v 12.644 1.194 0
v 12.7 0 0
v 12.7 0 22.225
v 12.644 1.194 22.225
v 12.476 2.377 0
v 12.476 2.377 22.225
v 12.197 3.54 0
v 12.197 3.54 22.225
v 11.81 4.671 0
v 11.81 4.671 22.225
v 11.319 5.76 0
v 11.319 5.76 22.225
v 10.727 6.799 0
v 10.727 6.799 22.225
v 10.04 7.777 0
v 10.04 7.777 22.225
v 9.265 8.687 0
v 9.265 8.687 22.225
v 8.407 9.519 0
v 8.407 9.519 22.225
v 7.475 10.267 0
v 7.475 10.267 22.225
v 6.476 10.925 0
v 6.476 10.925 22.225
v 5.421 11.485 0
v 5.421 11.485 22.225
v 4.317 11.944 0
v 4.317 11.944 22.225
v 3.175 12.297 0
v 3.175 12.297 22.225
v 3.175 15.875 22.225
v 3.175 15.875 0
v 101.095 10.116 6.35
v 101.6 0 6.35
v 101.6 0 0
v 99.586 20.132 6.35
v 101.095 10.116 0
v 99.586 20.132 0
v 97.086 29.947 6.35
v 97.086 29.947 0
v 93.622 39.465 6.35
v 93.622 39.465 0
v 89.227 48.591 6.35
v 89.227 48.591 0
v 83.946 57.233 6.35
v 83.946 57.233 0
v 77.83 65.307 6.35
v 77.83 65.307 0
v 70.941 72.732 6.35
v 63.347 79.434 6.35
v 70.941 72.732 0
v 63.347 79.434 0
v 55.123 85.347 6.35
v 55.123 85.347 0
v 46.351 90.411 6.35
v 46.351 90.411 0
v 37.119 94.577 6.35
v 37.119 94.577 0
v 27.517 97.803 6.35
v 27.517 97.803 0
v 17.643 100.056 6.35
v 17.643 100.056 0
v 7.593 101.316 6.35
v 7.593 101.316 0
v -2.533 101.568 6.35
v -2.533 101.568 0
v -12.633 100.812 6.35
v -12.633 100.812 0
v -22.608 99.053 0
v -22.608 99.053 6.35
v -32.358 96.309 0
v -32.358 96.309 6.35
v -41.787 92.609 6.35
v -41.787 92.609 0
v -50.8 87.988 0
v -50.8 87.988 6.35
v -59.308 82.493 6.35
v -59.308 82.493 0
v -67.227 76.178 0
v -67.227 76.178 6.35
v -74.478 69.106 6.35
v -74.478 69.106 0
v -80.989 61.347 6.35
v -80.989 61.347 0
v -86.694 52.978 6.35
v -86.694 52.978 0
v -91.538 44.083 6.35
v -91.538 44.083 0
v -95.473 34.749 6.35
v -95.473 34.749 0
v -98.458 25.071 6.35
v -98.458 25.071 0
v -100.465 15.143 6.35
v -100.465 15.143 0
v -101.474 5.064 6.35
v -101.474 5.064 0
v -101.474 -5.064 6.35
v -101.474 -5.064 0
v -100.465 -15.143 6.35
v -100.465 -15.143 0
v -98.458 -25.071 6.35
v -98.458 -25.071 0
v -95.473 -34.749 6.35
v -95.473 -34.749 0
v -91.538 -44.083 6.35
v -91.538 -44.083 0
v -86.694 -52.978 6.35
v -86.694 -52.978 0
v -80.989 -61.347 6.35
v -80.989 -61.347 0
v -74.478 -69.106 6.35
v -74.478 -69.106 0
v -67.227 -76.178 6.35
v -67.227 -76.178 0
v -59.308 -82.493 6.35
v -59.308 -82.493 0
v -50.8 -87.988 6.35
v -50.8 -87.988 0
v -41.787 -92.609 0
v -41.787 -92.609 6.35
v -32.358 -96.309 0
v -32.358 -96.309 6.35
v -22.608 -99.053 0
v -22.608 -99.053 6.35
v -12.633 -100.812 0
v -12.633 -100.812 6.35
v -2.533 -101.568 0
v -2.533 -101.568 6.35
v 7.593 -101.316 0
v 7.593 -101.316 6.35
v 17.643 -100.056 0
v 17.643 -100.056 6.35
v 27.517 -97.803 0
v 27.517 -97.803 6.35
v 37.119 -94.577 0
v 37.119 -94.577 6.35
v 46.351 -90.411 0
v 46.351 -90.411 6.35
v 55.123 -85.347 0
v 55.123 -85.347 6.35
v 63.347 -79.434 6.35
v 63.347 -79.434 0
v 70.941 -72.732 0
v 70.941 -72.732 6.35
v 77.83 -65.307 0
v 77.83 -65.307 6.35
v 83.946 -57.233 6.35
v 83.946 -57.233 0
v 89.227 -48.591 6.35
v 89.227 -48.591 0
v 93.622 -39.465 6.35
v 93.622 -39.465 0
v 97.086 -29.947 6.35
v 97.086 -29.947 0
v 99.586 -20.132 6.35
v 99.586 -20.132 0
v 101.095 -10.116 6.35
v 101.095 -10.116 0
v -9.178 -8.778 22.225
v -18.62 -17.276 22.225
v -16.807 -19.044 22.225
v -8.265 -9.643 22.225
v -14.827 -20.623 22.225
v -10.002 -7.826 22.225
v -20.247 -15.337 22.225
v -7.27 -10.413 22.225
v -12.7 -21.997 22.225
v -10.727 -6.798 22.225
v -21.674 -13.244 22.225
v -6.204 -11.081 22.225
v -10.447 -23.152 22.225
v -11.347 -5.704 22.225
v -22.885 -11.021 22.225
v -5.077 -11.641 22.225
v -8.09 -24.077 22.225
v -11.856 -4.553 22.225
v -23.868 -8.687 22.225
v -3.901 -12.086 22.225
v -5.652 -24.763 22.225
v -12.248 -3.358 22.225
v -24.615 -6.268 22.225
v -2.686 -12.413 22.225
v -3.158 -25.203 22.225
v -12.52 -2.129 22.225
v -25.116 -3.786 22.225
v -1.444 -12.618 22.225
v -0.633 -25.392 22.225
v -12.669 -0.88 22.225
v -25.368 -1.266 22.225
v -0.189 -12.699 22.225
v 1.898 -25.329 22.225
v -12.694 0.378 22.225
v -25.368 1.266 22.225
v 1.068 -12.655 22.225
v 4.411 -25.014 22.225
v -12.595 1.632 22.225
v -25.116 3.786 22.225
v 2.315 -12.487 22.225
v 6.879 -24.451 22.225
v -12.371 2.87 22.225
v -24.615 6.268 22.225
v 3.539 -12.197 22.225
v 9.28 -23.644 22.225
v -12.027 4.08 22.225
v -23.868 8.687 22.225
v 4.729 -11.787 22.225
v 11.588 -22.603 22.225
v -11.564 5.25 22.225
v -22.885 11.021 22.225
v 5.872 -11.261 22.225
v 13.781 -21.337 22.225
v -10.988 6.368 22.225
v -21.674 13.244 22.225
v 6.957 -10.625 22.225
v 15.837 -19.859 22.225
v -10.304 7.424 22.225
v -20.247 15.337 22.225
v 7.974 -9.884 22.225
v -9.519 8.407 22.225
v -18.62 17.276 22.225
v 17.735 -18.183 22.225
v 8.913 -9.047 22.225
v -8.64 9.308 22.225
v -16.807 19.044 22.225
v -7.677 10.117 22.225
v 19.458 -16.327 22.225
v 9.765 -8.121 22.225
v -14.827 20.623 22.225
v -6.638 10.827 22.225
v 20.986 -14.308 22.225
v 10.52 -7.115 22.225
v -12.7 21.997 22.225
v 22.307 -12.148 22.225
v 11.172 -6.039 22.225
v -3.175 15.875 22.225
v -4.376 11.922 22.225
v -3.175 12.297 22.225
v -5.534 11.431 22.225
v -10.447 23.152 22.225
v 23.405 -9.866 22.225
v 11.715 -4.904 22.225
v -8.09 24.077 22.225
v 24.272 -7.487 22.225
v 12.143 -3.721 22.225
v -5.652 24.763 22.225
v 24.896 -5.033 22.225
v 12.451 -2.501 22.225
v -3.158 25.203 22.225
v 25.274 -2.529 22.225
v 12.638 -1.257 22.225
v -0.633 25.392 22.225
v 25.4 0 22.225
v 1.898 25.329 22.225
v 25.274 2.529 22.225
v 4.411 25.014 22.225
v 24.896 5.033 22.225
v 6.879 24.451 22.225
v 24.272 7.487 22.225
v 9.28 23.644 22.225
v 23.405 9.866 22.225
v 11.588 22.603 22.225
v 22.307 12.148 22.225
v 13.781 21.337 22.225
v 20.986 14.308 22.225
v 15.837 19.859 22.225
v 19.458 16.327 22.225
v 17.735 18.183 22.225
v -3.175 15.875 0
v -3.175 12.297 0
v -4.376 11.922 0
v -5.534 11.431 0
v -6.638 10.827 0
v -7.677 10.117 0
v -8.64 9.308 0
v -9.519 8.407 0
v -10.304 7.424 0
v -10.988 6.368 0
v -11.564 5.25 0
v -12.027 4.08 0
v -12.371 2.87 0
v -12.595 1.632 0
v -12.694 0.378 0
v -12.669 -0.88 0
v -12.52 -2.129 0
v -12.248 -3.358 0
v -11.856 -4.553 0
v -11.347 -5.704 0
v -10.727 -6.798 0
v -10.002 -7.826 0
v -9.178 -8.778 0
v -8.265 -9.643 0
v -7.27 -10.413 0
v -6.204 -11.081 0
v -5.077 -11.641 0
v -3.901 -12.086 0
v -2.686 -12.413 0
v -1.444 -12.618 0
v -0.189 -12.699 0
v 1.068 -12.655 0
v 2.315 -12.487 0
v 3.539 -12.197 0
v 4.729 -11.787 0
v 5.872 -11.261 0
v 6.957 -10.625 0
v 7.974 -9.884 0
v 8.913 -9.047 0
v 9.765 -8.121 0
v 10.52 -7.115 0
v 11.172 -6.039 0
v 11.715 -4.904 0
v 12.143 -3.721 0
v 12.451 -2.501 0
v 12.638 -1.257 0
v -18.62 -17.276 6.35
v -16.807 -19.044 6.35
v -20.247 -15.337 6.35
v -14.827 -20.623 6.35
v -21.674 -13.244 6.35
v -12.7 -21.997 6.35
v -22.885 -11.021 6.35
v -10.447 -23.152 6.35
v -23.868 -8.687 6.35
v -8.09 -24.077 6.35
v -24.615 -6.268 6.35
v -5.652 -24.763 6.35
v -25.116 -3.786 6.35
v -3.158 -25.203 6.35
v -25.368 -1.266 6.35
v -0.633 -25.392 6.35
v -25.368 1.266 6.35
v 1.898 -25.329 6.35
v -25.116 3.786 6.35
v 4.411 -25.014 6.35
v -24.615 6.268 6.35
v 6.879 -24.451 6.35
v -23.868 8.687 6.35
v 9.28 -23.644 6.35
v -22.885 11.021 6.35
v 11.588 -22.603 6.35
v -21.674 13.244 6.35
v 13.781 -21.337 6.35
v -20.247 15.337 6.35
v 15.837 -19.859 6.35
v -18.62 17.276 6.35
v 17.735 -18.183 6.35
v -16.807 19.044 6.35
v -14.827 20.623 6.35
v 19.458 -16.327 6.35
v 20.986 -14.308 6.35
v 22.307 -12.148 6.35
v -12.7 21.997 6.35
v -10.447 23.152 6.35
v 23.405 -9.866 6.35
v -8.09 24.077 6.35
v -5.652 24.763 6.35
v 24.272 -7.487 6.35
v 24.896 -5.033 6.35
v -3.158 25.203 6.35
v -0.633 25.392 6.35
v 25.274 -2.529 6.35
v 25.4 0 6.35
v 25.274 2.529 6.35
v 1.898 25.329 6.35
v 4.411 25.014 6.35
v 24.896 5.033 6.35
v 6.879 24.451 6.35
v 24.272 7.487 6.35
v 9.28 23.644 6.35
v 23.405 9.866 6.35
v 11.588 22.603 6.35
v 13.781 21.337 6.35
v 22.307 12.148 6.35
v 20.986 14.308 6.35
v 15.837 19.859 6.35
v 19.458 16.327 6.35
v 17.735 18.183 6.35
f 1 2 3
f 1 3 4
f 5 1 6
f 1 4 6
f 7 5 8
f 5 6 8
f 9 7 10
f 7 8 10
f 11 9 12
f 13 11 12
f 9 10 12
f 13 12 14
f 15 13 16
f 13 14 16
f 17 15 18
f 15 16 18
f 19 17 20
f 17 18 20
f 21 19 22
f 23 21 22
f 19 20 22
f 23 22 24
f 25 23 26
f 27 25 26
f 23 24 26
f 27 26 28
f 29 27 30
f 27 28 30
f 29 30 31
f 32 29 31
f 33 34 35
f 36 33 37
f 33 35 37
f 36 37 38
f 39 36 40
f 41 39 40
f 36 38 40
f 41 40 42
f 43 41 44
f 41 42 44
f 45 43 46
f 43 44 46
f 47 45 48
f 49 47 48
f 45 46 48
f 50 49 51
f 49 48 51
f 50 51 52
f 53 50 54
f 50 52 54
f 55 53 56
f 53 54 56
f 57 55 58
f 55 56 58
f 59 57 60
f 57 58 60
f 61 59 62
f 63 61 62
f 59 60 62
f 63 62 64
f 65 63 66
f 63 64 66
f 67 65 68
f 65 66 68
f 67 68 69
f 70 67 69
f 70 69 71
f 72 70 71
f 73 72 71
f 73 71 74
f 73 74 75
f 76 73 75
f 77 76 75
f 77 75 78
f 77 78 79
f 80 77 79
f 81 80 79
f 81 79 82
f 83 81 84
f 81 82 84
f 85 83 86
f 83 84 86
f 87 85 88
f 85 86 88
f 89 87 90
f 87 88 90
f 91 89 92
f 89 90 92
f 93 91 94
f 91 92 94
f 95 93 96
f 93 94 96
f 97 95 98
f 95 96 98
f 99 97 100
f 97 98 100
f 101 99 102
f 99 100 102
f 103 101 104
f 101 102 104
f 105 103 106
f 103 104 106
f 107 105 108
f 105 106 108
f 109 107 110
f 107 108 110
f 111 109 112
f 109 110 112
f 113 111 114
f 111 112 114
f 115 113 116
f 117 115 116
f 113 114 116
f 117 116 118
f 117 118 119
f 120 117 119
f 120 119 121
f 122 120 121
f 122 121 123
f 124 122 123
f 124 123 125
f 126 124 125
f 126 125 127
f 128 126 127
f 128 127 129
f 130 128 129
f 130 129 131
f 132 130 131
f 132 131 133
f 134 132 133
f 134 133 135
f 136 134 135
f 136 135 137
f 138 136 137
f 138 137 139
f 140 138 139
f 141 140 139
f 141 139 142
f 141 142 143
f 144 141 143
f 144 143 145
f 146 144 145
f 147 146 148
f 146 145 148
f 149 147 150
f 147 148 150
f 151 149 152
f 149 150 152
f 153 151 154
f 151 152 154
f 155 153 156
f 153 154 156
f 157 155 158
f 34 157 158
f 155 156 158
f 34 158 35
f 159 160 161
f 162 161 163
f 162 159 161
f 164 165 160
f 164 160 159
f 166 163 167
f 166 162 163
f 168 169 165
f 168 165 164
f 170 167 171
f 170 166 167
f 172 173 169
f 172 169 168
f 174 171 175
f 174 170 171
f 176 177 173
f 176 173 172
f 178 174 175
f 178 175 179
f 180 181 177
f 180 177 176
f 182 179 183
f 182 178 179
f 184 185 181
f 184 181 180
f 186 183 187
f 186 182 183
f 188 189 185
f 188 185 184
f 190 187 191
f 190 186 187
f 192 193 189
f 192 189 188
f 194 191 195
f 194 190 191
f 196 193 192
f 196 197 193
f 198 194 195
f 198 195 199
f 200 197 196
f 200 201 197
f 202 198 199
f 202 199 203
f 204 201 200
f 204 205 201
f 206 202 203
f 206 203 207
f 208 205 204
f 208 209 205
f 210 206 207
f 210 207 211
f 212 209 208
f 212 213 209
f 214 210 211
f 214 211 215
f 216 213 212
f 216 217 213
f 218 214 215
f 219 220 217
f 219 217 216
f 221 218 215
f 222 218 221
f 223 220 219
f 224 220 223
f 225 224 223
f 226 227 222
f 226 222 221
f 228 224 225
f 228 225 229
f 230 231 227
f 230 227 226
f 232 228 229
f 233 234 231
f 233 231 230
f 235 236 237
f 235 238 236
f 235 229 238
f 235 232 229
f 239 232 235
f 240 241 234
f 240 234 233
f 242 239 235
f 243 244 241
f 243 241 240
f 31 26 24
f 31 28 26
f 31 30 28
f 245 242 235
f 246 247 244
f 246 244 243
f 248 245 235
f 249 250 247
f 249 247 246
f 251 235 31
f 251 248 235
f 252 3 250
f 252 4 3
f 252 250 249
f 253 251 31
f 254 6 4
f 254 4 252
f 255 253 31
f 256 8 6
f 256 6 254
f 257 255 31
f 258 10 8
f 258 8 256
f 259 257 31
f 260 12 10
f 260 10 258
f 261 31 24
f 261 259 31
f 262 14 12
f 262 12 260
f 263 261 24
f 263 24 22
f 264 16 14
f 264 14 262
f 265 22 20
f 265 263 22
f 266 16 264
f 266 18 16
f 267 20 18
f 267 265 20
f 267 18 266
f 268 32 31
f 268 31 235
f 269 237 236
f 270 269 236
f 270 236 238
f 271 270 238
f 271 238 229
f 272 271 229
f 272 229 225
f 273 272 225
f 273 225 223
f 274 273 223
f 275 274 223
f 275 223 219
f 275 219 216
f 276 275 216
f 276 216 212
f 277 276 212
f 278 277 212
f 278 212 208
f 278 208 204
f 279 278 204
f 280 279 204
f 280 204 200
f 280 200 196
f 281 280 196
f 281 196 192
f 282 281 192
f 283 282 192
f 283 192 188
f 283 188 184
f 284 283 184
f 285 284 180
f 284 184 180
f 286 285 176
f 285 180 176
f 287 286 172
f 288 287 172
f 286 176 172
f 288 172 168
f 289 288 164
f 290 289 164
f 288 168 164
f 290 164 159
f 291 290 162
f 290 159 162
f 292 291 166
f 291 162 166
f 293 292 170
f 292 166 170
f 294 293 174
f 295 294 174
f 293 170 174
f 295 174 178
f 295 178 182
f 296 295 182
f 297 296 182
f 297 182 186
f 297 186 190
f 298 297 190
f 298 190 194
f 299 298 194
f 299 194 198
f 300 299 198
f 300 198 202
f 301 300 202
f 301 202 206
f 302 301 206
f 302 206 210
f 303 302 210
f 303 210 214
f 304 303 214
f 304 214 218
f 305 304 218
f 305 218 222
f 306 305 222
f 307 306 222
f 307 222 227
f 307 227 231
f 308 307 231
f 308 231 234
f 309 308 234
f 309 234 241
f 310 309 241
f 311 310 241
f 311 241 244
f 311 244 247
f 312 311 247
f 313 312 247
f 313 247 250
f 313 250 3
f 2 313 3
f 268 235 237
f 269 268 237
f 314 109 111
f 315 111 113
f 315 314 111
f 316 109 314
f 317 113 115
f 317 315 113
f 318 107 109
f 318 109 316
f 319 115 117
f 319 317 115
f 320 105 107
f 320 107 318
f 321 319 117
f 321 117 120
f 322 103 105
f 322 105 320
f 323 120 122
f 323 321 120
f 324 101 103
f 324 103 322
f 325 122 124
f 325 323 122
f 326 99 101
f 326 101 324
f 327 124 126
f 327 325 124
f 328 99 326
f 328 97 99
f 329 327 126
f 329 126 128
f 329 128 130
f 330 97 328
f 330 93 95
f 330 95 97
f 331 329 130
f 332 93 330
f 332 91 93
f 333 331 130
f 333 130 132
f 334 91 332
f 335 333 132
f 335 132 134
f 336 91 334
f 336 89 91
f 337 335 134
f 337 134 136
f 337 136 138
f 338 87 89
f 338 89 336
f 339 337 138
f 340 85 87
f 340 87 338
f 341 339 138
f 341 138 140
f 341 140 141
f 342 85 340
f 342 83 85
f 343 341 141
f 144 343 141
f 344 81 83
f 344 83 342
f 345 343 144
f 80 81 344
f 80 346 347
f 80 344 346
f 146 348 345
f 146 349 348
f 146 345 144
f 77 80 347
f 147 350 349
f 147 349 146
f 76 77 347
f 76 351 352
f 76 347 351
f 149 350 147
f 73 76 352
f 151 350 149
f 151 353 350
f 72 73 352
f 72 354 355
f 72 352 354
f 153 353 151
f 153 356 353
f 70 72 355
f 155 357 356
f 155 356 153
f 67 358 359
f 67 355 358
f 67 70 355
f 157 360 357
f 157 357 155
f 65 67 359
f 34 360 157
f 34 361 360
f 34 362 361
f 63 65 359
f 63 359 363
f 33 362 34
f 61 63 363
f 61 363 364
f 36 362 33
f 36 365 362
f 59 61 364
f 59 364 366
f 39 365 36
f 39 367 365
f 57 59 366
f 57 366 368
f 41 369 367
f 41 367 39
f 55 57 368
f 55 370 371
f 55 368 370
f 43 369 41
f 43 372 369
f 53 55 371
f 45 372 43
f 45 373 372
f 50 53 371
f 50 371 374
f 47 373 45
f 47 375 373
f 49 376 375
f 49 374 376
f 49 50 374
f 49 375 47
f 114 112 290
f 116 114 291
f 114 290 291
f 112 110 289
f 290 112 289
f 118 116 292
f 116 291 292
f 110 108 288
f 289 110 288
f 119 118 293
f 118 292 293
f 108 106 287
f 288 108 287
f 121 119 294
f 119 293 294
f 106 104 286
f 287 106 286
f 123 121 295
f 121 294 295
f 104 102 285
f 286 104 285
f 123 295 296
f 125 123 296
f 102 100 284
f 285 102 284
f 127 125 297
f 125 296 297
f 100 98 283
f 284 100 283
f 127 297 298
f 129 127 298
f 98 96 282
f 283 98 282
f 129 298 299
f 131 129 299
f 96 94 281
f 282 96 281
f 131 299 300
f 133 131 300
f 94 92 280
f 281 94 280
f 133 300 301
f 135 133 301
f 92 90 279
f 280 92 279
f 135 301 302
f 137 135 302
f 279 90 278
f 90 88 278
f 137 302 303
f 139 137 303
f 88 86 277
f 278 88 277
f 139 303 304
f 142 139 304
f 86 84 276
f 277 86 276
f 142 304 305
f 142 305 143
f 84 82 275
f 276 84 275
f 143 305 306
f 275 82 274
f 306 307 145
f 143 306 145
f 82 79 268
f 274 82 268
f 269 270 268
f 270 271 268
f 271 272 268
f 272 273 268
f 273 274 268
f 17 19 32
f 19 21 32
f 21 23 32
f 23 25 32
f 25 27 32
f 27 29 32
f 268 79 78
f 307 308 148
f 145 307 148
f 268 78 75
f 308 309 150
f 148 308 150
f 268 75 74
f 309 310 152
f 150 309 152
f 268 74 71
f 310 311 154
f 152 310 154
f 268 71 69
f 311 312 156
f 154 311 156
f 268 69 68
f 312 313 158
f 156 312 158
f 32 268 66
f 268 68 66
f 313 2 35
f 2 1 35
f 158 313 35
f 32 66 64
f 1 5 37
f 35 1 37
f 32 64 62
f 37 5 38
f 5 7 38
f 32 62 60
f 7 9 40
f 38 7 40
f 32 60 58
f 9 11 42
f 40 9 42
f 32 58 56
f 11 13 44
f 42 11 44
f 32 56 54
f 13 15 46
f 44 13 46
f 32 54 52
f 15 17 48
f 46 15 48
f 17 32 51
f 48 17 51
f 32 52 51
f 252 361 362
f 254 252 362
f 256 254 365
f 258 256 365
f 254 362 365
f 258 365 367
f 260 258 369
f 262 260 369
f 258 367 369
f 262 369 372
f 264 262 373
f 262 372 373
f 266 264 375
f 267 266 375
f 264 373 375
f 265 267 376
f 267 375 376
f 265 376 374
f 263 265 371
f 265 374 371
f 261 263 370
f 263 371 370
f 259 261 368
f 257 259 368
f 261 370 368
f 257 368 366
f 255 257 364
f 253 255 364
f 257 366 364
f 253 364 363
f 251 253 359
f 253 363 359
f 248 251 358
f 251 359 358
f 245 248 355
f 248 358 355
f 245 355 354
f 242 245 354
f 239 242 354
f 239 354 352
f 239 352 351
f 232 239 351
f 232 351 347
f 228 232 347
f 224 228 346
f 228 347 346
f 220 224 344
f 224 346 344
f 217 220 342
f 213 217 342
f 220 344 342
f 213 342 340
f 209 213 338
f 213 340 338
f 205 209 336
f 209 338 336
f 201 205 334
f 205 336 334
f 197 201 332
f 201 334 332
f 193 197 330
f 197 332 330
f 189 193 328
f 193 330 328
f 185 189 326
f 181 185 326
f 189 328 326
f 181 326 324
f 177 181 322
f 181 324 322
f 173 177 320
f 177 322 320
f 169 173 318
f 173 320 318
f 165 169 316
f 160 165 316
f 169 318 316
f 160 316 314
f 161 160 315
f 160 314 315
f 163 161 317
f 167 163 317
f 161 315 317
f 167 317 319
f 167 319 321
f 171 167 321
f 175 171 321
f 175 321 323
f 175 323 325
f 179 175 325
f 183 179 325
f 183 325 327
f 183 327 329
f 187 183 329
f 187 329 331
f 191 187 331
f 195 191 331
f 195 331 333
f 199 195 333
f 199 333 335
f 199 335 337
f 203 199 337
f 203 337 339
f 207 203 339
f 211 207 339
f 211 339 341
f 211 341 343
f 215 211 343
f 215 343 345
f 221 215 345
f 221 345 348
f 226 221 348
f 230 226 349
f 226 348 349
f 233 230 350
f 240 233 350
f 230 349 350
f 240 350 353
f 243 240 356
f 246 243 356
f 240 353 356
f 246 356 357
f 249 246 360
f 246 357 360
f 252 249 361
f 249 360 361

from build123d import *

# Parameters (mm, degrees)
F0_R     = 101.6
F1_DEPTH = 6.35
F2_R     = 25.4
F3_DEPTH = 15.875
F5_DEPTH = 22.226


with BuildPart() as f1:
    # F0 (on Top) → F1 (new body)
    with BuildSketch(Plane.XY):
        Circle(F0_R)
    extrude(amount=F1_DEPTH)

    # F2 (on face) → F3 (join)
    with BuildSketch(Plane.XY.offset(6.35)):
        Circle(F2_R)
    extrude(amount=F3_DEPTH)

    # F4 (on face) → F5 (cut, through all)
    with BuildSketch(Plane.XY.offset(22.225)):
        with BuildLine():
            ThreePointArc((-3.175, 12.296722), (-7.77713, -10.040232), (12.7, 0))
            ThreePointArc((12.7, 0), (10.040232, 7.77713), (3.175, 12.296722))
            Line((3.175, 12.296722), (3.175, 9.525))
            Line((3.175, 9.525), (-3.175, 9.525))
            Line((-3.175, 9.525), (-3.175, 12.296722))
        make_face()
        with BuildLine():
            Line((3.175, 9.525), (3.175, 12.296722))
            ThreePointArc((3.175, 12.296722), (0, 12.7), (-3.175, 12.296722))
            Line((-3.175, 12.296722), (-3.175, 9.525))
            Line((-3.175, 9.525), (3.175, 9.525))
        make_face()
        with BuildLine():
            ThreePointArc((-3.175, 12.296722), (0, 12.7), (3.175, 12.296722))
            Line((3.175, 12.296722), (3.175, 15.875))
            Line((3.175, 15.875), (-3.175, 15.875))
            Line((-3.175, 15.875), (-3.175, 12.296722))
        make_face()
    extrude(amount=-F5_DEPTH, mode=Mode.SUBTRACT)


solid = f1.part
